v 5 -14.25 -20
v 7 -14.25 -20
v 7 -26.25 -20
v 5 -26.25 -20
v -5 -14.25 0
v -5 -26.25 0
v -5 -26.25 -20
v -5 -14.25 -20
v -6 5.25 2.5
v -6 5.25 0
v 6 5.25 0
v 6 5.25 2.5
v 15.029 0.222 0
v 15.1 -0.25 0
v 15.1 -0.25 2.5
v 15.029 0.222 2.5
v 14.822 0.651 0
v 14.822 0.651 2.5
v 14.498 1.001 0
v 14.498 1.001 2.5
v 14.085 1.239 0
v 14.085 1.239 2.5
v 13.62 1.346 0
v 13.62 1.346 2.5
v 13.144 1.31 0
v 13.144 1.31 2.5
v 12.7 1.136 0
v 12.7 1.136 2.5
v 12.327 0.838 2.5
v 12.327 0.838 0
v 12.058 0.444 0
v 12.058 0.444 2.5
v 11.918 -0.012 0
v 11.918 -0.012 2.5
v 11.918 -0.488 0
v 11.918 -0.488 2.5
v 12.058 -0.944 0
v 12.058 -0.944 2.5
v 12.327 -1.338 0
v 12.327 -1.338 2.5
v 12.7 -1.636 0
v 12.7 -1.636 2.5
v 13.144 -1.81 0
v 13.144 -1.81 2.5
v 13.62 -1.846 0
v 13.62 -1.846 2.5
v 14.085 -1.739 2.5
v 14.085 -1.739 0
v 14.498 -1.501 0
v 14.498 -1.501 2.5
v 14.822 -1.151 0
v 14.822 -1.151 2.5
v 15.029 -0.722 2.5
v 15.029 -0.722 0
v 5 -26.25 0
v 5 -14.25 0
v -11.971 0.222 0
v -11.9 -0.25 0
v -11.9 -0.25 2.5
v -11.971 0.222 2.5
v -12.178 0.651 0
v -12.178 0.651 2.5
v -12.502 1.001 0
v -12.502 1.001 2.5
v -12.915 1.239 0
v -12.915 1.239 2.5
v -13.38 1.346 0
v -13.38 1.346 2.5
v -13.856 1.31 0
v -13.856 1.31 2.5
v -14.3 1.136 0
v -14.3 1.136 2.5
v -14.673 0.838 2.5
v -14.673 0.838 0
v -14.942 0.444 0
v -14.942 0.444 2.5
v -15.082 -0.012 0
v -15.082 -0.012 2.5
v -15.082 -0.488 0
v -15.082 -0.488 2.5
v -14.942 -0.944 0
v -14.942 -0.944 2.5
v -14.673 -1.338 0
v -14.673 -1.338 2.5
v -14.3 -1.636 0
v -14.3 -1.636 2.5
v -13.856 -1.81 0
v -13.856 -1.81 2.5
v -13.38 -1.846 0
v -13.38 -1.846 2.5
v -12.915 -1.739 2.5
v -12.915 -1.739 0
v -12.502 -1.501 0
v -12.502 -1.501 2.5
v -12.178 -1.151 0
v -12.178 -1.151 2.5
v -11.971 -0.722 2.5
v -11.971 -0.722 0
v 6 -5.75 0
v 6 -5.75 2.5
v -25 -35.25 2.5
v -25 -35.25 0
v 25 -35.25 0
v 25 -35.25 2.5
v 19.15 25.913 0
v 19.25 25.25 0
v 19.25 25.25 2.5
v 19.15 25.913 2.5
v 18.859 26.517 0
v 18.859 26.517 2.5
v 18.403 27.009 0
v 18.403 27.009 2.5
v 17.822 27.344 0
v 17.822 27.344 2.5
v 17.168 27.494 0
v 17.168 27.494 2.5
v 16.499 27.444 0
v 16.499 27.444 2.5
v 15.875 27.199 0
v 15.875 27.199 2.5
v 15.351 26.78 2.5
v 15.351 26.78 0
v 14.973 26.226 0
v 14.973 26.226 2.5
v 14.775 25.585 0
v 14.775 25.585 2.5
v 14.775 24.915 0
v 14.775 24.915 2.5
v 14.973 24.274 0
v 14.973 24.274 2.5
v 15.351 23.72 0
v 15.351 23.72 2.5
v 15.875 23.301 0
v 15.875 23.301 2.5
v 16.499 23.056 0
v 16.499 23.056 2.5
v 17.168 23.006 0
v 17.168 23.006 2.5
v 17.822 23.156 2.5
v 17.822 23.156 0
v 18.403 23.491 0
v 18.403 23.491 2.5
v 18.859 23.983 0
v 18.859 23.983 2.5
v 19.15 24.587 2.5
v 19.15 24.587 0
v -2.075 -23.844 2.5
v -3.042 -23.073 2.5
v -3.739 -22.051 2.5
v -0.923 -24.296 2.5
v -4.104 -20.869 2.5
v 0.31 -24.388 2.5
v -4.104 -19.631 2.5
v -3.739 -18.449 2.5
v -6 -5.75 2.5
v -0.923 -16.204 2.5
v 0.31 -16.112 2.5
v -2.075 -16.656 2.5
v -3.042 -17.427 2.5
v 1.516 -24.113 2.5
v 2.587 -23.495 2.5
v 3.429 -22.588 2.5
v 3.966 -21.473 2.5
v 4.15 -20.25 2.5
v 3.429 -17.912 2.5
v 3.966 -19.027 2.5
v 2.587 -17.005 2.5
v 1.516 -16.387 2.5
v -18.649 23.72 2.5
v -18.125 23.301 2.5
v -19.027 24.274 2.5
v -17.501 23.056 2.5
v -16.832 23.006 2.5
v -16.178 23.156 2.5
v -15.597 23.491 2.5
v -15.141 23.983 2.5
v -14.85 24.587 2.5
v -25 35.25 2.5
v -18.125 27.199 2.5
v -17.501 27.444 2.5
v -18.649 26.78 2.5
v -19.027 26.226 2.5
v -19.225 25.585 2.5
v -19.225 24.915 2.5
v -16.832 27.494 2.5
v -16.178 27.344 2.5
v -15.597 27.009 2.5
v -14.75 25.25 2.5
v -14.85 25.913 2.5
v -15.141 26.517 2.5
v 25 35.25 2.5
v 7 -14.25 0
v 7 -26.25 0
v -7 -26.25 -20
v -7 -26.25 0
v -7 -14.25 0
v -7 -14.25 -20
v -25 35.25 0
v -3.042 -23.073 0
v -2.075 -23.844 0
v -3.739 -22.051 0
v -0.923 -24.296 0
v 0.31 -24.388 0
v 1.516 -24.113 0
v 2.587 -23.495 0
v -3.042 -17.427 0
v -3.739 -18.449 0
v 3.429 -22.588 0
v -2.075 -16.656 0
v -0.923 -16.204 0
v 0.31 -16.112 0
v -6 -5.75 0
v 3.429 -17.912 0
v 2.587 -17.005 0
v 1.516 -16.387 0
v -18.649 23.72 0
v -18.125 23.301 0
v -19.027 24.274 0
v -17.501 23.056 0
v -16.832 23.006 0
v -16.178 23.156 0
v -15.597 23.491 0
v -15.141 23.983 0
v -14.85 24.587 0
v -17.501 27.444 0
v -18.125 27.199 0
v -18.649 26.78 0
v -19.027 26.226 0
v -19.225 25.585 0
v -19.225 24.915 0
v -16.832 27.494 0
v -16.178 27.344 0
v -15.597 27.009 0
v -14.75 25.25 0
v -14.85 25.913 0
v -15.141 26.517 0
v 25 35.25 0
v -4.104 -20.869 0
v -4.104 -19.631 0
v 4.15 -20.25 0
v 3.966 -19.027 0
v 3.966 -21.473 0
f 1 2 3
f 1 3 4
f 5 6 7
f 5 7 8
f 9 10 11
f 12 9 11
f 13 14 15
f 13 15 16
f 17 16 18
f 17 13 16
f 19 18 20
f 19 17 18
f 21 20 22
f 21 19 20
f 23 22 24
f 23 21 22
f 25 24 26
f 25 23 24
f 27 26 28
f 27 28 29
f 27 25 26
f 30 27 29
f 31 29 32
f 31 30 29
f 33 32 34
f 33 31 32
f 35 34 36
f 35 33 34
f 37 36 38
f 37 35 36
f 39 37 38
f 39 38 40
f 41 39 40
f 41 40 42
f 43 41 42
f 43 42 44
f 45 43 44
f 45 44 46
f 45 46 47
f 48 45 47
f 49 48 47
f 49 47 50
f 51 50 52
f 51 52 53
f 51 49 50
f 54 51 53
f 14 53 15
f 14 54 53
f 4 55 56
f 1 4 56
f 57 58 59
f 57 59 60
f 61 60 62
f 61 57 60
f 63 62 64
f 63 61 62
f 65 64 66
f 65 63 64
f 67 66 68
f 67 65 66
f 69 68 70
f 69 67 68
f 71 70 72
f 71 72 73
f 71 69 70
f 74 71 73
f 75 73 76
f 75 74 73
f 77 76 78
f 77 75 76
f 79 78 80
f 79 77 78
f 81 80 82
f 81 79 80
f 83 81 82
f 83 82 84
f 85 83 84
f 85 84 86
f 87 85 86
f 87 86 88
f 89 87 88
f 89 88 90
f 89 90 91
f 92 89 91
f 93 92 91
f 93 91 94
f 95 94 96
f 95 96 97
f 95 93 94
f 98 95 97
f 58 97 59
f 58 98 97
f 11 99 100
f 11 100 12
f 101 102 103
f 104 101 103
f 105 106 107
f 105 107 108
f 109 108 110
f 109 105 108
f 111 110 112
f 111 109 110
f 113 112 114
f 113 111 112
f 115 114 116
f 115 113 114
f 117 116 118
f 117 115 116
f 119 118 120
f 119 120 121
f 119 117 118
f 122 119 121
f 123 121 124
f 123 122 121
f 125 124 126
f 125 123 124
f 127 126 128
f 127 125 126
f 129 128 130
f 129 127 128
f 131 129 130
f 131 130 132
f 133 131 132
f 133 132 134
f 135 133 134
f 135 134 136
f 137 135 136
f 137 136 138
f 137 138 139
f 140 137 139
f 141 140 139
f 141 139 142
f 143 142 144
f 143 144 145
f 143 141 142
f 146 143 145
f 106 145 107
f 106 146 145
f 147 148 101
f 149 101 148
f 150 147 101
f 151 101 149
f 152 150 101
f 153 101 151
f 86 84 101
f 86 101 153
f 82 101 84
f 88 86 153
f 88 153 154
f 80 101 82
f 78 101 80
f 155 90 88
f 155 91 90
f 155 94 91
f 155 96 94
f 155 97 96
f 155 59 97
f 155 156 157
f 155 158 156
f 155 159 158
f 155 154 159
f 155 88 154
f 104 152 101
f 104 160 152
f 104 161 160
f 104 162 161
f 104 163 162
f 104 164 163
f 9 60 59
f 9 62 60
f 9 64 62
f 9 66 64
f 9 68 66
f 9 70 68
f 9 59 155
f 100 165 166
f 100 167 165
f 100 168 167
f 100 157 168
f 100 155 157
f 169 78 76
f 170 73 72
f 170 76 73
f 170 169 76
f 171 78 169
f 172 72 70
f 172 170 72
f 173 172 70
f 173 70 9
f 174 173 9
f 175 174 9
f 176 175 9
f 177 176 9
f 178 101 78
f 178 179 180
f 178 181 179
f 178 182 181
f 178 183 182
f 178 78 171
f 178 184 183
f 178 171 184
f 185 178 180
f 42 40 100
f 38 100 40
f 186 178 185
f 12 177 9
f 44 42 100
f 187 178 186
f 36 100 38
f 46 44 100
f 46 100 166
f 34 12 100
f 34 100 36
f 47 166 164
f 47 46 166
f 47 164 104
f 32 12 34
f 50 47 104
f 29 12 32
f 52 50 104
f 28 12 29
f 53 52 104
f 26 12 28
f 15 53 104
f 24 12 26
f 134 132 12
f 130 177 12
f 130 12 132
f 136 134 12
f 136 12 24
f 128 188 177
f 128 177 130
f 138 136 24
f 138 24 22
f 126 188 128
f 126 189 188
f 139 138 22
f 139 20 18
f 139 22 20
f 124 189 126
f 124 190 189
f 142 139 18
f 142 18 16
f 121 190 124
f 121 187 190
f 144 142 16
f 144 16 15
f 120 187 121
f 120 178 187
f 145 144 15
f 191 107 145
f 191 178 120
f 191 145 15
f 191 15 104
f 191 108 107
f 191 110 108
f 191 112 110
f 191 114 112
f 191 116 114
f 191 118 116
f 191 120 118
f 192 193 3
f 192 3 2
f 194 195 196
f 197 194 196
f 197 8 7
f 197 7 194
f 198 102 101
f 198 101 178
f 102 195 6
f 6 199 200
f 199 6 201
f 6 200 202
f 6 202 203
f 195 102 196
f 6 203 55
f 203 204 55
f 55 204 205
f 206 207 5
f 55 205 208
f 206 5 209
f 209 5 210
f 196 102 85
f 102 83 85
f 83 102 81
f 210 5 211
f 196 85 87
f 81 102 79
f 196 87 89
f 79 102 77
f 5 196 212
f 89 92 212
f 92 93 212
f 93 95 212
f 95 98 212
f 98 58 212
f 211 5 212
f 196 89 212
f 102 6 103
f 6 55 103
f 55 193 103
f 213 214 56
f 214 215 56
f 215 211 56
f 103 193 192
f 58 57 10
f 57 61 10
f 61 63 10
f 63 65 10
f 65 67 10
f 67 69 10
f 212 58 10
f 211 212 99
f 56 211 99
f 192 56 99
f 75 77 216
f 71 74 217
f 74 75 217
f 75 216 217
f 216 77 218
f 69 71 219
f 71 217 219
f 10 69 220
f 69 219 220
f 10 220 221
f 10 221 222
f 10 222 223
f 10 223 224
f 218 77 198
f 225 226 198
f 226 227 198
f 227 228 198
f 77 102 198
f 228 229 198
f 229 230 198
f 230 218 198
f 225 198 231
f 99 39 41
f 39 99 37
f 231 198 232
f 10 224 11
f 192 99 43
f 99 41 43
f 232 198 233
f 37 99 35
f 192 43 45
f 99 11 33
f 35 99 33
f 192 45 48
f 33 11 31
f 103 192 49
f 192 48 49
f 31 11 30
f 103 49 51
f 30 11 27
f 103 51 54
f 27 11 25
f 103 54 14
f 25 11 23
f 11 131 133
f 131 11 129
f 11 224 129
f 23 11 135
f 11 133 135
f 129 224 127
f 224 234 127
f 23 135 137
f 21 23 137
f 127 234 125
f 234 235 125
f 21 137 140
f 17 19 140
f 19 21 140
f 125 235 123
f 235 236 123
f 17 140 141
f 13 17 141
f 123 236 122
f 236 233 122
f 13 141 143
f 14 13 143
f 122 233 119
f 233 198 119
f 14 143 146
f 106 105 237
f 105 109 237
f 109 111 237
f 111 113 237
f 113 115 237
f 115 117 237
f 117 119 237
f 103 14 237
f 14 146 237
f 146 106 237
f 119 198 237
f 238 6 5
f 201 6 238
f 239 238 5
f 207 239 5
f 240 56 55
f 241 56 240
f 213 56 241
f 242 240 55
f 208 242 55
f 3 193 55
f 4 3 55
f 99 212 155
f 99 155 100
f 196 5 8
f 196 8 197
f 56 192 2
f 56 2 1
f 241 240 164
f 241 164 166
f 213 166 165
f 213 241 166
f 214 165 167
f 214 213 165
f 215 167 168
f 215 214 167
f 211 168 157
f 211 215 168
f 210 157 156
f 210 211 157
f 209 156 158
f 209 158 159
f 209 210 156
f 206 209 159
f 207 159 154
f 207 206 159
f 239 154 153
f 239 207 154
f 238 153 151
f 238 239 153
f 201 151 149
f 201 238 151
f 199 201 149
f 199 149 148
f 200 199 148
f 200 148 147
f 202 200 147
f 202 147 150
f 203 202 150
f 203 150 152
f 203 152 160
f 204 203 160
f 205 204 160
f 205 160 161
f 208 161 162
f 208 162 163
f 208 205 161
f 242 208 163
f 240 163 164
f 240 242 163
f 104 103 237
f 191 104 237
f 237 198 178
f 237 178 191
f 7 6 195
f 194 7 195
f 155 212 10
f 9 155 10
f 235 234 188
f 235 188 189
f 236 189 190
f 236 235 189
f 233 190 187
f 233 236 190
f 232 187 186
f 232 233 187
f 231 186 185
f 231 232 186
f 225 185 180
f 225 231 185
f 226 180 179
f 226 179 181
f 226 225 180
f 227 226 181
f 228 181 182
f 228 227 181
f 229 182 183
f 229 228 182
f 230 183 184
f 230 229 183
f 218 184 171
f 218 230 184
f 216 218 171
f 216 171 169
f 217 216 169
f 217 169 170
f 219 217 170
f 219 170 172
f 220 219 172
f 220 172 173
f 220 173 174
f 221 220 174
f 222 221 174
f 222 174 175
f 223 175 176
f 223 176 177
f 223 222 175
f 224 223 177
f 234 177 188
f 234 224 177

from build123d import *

# Parameters (mm, degrees)
SKETCH1_W           = 50
SKETCH1_H           = 70.5
SKETCH1_R           = 2.25
SKETCH1_R_2         = 1.6
SKETCH1_R_3         = 4.15
SKETCH1_W_2         = 12
SKETCH1_H_2         = 11
BOSS_EXTRUDE1_DEPTH = 2.5
SKETCH2_W           = 2
SKETCH2_H           = 12
BOSS_EXTRUDE2_DEPTH = 20


with BuildPart() as part:
    # Sketch1 → Boss-Extrude1 (new body)
    with BuildSketch(Plane.XY):
        Rectangle(SKETCH1_W, SKETCH1_H)
        with Locations((-17, 25.25)):
            Circle(SKETCH1_R, mode=Mode.SUBTRACT)
        with Locations((17, 25.25)):
            Circle(SKETCH1_R, mode=Mode.SUBTRACT)
        with Locations((-13.5, -0.25)):
            Circle(SKETCH1_R_2, mode=Mode.SUBTRACT)
        with Locations((13.5, -0.25)):
            Circle(SKETCH1_R_2, mode=Mode.SUBTRACT)
        with Locations((0, -20.25)):
            Circle(SKETCH1_R_3, mode=Mode.SUBTRACT)
        with Locations((0, -0.25)):
            Rectangle(SKETCH1_W_2, SKETCH1_H_2, mode=Mode.SUBTRACT)
    extrude(amount=BOSS_EXTRUDE1_DEPTH)

    # Sketch2 → Boss-Extrude2 (add)
    with BuildSketch(Plane(origin=(0, 0, 0), x_dir=(-1, 0, 0), z_dir=(0, 0, -1))):
        with Locations((6, -20.25)):
            Rectangle(SKETCH2_W, SKETCH2_H)
        with Locations((-6, -20.25)):
            Rectangle(SKETCH2_W, SKETCH2_H)
    extrude(amount=BOSS_EXTRUDE2_DEPTH)


solid = part.part
